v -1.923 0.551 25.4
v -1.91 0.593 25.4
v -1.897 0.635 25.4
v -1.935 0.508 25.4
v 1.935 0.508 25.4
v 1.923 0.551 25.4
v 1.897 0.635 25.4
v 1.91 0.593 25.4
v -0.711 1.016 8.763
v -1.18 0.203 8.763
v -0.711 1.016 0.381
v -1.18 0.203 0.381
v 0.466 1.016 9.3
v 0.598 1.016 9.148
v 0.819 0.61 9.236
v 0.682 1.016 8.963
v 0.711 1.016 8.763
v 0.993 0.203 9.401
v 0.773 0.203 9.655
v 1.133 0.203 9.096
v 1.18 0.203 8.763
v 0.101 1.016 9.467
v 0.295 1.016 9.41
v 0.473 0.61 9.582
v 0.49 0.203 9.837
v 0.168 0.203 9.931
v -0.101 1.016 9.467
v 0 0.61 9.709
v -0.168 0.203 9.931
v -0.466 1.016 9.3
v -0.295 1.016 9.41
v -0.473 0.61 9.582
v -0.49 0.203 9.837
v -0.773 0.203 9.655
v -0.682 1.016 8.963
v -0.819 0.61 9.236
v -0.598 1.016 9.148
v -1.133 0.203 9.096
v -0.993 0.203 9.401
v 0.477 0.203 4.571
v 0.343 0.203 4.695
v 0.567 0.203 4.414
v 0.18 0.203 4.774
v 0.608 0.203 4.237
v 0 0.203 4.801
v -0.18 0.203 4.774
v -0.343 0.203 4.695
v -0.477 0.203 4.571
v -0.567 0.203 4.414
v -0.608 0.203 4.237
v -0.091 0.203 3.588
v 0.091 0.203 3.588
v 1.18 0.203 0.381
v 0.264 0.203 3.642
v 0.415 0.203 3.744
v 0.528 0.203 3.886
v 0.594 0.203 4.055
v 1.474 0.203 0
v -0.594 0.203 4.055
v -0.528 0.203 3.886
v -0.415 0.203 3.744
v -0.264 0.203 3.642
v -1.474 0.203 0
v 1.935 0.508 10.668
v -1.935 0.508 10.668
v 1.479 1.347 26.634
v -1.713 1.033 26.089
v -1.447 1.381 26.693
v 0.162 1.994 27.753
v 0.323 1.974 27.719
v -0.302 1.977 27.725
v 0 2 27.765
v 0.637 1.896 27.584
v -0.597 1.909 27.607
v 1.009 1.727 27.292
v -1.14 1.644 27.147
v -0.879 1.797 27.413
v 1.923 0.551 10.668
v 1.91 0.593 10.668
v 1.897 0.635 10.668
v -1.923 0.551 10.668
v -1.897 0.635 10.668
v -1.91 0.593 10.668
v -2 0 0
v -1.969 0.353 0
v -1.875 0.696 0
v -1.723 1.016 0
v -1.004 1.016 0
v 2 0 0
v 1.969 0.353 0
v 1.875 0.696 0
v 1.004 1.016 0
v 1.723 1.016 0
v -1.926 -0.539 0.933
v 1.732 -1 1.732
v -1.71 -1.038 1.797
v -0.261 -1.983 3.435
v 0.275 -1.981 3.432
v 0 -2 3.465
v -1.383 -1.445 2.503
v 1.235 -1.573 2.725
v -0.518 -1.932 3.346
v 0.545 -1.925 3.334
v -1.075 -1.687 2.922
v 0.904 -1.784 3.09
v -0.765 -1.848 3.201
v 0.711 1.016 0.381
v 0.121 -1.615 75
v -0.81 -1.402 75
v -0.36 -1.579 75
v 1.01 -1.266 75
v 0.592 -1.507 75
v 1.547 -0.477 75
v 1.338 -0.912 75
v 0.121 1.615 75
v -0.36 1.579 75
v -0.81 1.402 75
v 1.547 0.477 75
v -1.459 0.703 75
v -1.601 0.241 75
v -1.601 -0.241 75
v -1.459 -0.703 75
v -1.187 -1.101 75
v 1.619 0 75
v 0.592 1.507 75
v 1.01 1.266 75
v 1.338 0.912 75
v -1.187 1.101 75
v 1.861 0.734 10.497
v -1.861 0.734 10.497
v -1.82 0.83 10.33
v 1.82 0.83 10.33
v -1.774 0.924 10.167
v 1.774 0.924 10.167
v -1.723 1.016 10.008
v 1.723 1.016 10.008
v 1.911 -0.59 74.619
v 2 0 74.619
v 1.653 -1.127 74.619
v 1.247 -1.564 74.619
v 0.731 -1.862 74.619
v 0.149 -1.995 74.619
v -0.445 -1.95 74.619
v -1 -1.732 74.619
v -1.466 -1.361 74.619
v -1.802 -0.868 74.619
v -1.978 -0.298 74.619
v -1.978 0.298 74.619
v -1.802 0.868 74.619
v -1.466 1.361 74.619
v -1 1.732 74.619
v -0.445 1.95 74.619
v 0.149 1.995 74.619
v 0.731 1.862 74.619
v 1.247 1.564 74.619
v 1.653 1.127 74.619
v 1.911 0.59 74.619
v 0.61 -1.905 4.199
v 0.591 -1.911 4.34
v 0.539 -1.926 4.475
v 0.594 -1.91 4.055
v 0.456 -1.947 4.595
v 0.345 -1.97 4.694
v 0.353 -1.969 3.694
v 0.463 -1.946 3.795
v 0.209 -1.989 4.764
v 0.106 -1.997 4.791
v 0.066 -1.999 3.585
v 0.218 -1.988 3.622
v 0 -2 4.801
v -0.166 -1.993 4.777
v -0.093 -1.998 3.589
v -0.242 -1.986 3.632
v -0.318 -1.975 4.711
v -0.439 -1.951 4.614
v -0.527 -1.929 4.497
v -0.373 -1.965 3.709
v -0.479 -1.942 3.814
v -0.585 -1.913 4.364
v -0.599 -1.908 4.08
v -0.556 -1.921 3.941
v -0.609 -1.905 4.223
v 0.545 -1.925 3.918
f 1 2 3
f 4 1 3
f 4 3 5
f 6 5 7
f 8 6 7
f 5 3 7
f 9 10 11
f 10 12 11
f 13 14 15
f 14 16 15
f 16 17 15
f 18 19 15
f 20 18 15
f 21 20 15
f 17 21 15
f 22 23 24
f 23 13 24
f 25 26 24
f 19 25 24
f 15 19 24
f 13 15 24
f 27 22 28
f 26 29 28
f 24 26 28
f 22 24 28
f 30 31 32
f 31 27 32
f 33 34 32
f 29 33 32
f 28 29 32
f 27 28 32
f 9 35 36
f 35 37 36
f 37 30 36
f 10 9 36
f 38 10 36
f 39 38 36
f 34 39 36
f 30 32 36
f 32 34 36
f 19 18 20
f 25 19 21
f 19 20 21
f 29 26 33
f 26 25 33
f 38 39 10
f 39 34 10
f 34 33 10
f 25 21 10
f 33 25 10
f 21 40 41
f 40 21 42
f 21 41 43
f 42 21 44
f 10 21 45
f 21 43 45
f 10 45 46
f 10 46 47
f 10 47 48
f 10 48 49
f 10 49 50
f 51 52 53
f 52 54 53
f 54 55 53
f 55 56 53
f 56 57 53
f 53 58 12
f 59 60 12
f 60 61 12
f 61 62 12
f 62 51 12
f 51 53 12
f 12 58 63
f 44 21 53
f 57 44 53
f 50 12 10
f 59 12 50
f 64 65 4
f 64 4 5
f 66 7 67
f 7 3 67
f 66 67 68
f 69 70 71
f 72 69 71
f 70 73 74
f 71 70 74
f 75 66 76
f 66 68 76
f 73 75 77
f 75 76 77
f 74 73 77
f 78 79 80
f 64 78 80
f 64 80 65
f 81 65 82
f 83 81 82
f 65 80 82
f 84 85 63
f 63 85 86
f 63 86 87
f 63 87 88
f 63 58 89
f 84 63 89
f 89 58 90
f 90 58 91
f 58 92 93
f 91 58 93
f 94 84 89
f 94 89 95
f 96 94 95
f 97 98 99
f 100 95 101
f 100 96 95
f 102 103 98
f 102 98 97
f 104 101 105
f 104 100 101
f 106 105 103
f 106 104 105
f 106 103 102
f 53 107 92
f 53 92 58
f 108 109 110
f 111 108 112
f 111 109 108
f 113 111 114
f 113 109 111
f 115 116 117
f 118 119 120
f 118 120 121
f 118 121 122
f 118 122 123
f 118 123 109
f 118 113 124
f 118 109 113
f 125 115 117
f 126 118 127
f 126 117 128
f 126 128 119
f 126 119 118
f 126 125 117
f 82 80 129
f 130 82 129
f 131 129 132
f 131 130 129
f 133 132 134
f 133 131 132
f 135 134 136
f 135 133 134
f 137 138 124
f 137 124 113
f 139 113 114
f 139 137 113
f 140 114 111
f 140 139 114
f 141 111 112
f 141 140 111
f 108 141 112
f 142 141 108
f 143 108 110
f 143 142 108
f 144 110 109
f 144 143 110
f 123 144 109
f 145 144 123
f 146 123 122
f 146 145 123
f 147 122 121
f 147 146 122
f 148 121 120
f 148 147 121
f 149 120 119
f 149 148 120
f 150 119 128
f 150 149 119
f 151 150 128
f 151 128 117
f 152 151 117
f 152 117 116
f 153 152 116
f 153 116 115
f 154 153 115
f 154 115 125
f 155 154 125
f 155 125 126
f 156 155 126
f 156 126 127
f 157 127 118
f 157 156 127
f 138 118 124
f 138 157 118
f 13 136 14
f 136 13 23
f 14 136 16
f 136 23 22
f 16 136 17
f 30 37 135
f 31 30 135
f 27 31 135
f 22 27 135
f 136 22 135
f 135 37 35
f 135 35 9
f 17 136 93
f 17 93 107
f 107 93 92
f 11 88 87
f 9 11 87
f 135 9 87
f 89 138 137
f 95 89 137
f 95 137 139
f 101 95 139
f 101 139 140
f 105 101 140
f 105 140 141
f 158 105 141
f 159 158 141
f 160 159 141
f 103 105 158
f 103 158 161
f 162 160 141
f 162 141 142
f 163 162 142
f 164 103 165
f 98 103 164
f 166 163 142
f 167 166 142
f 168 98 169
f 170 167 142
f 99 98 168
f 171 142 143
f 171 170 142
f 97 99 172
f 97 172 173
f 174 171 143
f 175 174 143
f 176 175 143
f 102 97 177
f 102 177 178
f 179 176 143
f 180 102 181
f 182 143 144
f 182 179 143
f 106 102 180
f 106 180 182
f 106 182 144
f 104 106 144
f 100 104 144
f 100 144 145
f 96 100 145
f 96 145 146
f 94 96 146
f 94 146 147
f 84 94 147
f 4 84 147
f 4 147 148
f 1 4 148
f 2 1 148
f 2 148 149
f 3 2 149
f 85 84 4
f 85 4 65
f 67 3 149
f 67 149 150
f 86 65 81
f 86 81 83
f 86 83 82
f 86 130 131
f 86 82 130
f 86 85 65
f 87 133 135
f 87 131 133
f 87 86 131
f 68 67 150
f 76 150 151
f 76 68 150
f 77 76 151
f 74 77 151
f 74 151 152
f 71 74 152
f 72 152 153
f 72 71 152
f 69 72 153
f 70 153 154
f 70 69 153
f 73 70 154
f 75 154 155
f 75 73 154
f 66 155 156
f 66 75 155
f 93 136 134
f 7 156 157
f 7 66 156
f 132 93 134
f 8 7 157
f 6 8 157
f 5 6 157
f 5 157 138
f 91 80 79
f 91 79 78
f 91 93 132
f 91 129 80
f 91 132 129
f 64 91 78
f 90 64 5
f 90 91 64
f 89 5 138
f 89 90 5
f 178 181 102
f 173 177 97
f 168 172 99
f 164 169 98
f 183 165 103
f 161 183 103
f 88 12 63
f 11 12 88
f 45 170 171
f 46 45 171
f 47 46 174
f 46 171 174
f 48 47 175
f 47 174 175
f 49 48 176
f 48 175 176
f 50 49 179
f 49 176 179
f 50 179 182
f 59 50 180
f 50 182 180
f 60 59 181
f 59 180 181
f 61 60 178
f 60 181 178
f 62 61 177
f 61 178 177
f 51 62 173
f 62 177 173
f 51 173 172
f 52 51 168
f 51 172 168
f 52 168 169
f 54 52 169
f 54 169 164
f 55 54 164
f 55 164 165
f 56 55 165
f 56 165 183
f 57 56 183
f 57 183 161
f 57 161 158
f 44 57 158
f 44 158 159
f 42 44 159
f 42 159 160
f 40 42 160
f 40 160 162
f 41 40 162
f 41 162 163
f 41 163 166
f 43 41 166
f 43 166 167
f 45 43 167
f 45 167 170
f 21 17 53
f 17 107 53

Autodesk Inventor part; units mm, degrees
ref_plane "YZ Plane" through (0, 0, 0) normal (1, 0, 0) x (0, 1, 0)
ref_plane "XZ Plane" through (0, 0, 0) normal (0, 1, 0) x (-1, 0, 0)
ref_plane "XY Plane" through (0, 0, 0) normal (0, 0, 1) x (1, 0, 0)
sketch "Sketch1" plane through (0, 0, 0) normal (0, 0, 1) x (1, 0, 0)
  circle A0 centre (0, 0) radius 2.00025
  dimension "d0" = 4.0005
extrude "Extrusion1" add sketch "Sketch1" along normal blind 75
sketch "Sketch2" plane through (0, 0, 0) normal (0, 0, 1) x (1, 0, 0)
  circle A0 centre (0, 0) radius 2.00025
  line L0 (1.353027, 1.4732) -> (-1.353027, 1.4732)
  line L1 (0, 2.80035) -> (0, -2.80035)
  line L2 (-2.80035, 0) -> (2.80035, 0)
  line L3 (1.723004, 1.016) -> (-1.723004, 1.016)
  line L4 (0.7112, 1.016) -> (1.18047, 0.2032)
  line L5 (1.18047, 0.2032) -> (-1.18047, 0.2032)
  line L6 (-1.18047, 0.2032) -> (-0.7112, 1.016)
  line L7 (0, 0) -> (0, 2.00025)
  dimension "d6" = 1.016
  dimension "d9" = 60
  dimension "d10" = 1.4224
  dimension "d11" = 0.8128
  dimension "d40" = 0.4572
extrude "Extrusion3" cut sketch "Sketch2" along normal blind 9.525 contours L3 L1 L0 A0 | L1 L3 A0 L0
extrude "Extrusion4" cut sketch "Sketch2" along normal blind 8.763 contours L4 L5 L1 L3 | L5 L6 L3 L1
sketch "Sketch3" plane through (-1.18047, 0.2032, 9.525) normal (0, 1, 0) x (1, 0, 0)
  line L0 (0, 9.525) -> (2.360941, 9.525)
  line L1 (1.18047, 24.525) -> (1.18047, -80.475)
  point P0 (1.18047, 9.525)
  point P1 (1.18047, 5.334)
  dimension "d14" = 4.191
hole "Hole1" at (0, 0.2032, 4.191) direction (0, -1, 0) diameter 1.2192 end through all thread size "M1.6x0.35" class "6H" standard "ANSI Metric M Profile"
sketch "Sketch4" plane through (0, 0, 0) normal (1, 0, 0) x (0, 1, 0)
  line L0 (0, 120) -> (0, -20)
  line L1 (-2.00025, 0) -> (-2.00025, 75)
  line L2 (0, 0) -> (-2.00025, 3.464535)
  line L3 (-2.00025, 3.464535) -> (-2.00025, 0)
  line L4 (-2.00025, 0) -> (0, 0)
  dimension "d23" = 30
extrude "Extrusion5" cut sketch "Sketch4" along normal mid plane 12.7
chamfer "Chamfer1" distance 0.254 distance2 0.381 1 edges at (-0.9458, 0.6096, 0) measured on face at (-1.2049, 0.7451, 0)
chamfer "Chamfer2" distance 0.254 distance2 0.381 1 edges at (0.9458, 0.6096, 0) measured on face at (1.2049, 0.7451, 0)
chamfer "Chamfer3" distance 0.381 angle 45 1 edges at (-2.0003, 0, 75)
extrude "Extrusion7" cut sketch "Sketch2" along normal blind 25.4 contours L3 L1 L0 A0 | L0 L1 A0 | L1 L0 A0 | L1 L3 A0 L0
sketch "Sketch6" plane through (-0.7112, 1.016, 9.525) normal (0, 1, 0) x (1, 0, 0)
  line L0 (-1.011804, -15.875) -> (2.434204, -15.875)
  line L1 (0.7112, 24.525) -> (0.7112, -80.475)
  line L2 (6.9342, 9.525) -> (-5.5118, 9.525)
  line L3 (5.1562, -1.143) -> (-3.7338, -1.143)
  line L4 (-3.7338, -1.143) -> (-3.7338, -15.875)
  line L5 (-3.7338, -15.875) -> (5.1562, -15.875)
  line L6 (5.1562, -15.875) -> (5.1562, -1.143)
  line L7 (5.1562, -1.143) -> (-3.7338, -15.875) construction
  line L8 (-3.7338, -1.143) -> (5.1562, -15.875) construction
  point P0 (0.7112, 9.525)
  point P1 (0.7112, -8.509)
  dimension "d43" = 0
  dimension "d45" = 8.89
  dimension "d68" = 10.668
  dimension "d69" = 14.732
extrude "Extrusion8" cut sketch "Sketch6" against normal blind 0.508
sketch "Sketch11" plane through (0, 0, 0) normal (1, 0, 0) x (0, 1, 0)
  line L0 (0.508, 10.668) -> (0.508, 25.4)
  line L1 (2.00025, 25.4) -> (2.00025, 74.619)
  line L2 (0.635, 25.4) -> (2.00025, 27.764682)
  line L3 (0.508, 10.668) -> (1.016, 10.668)
  line L4 (-0.40005, 0) -> (2.4003, 0)
  line L5 (0.635, 10.668) -> (1.016, 10.008089)
  line L6 (1.016, 10.008089) -> (1.016, 10.668)
  line L7 (0.635, 10.668) -> (1.016, 10.668)
  line L8 (2.00025, 27.764682) -> (2.00025, 25.4)
  line L9 (2.00025, 25.4) -> (0.508, 25.4)
  line L10 (0.635, 25.4) -> (2.00025, 25.4)
  point P0 (0, 0)
  dimension "d56" = 0.127
  dimension "d57" = 10.668
  dimension "d58" = 0.127
  dimension "d59" = 30
  dimension "d64" = 30
extrude "Extrusion10" cut sketch "Sketch11" along normal mid plane 6.35
sketch "Sketch12" plane through (-1.473764, 0.2032, 0) normal (0, 1, 0) x (1, 0, 0)
  circle A0 centre (1.473764, -4.191) radius 0.6096
  circle A1 centre (1.473764, -4.191) radius 0.8
  circle A2 centre (1.473764, -4.191) radius 0.7
  point P0 (1.473764, 0)
  dimension "d65" = 1.6
  dimension "d66" = 1.4
sketch "Sketch14" plane through (0, 0, 8.763) normal (0, 0, -1) x (-1, 0, 0)
  line L0 (0.7112, 1.016) -> (1.18047, 0.2032)
  line L1 (-1.473764, 0.2032) -> (1.473764, 0.2032)
  line L2 (0.7112, 1.016) -> (0.7112, 0.2032)
  line L3 (1.18047, 0.2032) -> (-1.18047, 0.2032)
  line L4 (0.7112, 0.2032) -> (1.18047, 0.2032)
  line L5 (0, -2.80035) -> (0, 2.80035)
  line L6 (0, 0.2032) -> (0, 1.016)
  line L7 (0.7112, 1.016) -> (0, 1.016)
  line L8 (0, 1.016) -> (0, 0.2032)
  line L9 (0, 0.2032) -> (0.7112, 0.2032)
  line L10 (0.7112, 0.2032) -> (0.7112, 1.016)
  point P0 (0, 0)
revolve "Revolution1" cut sketch "Sketch14" angle 360 about axis through (0, 0, 8.763) along (0, 1, 0)
properties part number "J008040 NEUROPIXELS GEN 2 DOVE TAIL PROBE HOLDER Rev -" material "ALUMINUM, 7075-T651"
